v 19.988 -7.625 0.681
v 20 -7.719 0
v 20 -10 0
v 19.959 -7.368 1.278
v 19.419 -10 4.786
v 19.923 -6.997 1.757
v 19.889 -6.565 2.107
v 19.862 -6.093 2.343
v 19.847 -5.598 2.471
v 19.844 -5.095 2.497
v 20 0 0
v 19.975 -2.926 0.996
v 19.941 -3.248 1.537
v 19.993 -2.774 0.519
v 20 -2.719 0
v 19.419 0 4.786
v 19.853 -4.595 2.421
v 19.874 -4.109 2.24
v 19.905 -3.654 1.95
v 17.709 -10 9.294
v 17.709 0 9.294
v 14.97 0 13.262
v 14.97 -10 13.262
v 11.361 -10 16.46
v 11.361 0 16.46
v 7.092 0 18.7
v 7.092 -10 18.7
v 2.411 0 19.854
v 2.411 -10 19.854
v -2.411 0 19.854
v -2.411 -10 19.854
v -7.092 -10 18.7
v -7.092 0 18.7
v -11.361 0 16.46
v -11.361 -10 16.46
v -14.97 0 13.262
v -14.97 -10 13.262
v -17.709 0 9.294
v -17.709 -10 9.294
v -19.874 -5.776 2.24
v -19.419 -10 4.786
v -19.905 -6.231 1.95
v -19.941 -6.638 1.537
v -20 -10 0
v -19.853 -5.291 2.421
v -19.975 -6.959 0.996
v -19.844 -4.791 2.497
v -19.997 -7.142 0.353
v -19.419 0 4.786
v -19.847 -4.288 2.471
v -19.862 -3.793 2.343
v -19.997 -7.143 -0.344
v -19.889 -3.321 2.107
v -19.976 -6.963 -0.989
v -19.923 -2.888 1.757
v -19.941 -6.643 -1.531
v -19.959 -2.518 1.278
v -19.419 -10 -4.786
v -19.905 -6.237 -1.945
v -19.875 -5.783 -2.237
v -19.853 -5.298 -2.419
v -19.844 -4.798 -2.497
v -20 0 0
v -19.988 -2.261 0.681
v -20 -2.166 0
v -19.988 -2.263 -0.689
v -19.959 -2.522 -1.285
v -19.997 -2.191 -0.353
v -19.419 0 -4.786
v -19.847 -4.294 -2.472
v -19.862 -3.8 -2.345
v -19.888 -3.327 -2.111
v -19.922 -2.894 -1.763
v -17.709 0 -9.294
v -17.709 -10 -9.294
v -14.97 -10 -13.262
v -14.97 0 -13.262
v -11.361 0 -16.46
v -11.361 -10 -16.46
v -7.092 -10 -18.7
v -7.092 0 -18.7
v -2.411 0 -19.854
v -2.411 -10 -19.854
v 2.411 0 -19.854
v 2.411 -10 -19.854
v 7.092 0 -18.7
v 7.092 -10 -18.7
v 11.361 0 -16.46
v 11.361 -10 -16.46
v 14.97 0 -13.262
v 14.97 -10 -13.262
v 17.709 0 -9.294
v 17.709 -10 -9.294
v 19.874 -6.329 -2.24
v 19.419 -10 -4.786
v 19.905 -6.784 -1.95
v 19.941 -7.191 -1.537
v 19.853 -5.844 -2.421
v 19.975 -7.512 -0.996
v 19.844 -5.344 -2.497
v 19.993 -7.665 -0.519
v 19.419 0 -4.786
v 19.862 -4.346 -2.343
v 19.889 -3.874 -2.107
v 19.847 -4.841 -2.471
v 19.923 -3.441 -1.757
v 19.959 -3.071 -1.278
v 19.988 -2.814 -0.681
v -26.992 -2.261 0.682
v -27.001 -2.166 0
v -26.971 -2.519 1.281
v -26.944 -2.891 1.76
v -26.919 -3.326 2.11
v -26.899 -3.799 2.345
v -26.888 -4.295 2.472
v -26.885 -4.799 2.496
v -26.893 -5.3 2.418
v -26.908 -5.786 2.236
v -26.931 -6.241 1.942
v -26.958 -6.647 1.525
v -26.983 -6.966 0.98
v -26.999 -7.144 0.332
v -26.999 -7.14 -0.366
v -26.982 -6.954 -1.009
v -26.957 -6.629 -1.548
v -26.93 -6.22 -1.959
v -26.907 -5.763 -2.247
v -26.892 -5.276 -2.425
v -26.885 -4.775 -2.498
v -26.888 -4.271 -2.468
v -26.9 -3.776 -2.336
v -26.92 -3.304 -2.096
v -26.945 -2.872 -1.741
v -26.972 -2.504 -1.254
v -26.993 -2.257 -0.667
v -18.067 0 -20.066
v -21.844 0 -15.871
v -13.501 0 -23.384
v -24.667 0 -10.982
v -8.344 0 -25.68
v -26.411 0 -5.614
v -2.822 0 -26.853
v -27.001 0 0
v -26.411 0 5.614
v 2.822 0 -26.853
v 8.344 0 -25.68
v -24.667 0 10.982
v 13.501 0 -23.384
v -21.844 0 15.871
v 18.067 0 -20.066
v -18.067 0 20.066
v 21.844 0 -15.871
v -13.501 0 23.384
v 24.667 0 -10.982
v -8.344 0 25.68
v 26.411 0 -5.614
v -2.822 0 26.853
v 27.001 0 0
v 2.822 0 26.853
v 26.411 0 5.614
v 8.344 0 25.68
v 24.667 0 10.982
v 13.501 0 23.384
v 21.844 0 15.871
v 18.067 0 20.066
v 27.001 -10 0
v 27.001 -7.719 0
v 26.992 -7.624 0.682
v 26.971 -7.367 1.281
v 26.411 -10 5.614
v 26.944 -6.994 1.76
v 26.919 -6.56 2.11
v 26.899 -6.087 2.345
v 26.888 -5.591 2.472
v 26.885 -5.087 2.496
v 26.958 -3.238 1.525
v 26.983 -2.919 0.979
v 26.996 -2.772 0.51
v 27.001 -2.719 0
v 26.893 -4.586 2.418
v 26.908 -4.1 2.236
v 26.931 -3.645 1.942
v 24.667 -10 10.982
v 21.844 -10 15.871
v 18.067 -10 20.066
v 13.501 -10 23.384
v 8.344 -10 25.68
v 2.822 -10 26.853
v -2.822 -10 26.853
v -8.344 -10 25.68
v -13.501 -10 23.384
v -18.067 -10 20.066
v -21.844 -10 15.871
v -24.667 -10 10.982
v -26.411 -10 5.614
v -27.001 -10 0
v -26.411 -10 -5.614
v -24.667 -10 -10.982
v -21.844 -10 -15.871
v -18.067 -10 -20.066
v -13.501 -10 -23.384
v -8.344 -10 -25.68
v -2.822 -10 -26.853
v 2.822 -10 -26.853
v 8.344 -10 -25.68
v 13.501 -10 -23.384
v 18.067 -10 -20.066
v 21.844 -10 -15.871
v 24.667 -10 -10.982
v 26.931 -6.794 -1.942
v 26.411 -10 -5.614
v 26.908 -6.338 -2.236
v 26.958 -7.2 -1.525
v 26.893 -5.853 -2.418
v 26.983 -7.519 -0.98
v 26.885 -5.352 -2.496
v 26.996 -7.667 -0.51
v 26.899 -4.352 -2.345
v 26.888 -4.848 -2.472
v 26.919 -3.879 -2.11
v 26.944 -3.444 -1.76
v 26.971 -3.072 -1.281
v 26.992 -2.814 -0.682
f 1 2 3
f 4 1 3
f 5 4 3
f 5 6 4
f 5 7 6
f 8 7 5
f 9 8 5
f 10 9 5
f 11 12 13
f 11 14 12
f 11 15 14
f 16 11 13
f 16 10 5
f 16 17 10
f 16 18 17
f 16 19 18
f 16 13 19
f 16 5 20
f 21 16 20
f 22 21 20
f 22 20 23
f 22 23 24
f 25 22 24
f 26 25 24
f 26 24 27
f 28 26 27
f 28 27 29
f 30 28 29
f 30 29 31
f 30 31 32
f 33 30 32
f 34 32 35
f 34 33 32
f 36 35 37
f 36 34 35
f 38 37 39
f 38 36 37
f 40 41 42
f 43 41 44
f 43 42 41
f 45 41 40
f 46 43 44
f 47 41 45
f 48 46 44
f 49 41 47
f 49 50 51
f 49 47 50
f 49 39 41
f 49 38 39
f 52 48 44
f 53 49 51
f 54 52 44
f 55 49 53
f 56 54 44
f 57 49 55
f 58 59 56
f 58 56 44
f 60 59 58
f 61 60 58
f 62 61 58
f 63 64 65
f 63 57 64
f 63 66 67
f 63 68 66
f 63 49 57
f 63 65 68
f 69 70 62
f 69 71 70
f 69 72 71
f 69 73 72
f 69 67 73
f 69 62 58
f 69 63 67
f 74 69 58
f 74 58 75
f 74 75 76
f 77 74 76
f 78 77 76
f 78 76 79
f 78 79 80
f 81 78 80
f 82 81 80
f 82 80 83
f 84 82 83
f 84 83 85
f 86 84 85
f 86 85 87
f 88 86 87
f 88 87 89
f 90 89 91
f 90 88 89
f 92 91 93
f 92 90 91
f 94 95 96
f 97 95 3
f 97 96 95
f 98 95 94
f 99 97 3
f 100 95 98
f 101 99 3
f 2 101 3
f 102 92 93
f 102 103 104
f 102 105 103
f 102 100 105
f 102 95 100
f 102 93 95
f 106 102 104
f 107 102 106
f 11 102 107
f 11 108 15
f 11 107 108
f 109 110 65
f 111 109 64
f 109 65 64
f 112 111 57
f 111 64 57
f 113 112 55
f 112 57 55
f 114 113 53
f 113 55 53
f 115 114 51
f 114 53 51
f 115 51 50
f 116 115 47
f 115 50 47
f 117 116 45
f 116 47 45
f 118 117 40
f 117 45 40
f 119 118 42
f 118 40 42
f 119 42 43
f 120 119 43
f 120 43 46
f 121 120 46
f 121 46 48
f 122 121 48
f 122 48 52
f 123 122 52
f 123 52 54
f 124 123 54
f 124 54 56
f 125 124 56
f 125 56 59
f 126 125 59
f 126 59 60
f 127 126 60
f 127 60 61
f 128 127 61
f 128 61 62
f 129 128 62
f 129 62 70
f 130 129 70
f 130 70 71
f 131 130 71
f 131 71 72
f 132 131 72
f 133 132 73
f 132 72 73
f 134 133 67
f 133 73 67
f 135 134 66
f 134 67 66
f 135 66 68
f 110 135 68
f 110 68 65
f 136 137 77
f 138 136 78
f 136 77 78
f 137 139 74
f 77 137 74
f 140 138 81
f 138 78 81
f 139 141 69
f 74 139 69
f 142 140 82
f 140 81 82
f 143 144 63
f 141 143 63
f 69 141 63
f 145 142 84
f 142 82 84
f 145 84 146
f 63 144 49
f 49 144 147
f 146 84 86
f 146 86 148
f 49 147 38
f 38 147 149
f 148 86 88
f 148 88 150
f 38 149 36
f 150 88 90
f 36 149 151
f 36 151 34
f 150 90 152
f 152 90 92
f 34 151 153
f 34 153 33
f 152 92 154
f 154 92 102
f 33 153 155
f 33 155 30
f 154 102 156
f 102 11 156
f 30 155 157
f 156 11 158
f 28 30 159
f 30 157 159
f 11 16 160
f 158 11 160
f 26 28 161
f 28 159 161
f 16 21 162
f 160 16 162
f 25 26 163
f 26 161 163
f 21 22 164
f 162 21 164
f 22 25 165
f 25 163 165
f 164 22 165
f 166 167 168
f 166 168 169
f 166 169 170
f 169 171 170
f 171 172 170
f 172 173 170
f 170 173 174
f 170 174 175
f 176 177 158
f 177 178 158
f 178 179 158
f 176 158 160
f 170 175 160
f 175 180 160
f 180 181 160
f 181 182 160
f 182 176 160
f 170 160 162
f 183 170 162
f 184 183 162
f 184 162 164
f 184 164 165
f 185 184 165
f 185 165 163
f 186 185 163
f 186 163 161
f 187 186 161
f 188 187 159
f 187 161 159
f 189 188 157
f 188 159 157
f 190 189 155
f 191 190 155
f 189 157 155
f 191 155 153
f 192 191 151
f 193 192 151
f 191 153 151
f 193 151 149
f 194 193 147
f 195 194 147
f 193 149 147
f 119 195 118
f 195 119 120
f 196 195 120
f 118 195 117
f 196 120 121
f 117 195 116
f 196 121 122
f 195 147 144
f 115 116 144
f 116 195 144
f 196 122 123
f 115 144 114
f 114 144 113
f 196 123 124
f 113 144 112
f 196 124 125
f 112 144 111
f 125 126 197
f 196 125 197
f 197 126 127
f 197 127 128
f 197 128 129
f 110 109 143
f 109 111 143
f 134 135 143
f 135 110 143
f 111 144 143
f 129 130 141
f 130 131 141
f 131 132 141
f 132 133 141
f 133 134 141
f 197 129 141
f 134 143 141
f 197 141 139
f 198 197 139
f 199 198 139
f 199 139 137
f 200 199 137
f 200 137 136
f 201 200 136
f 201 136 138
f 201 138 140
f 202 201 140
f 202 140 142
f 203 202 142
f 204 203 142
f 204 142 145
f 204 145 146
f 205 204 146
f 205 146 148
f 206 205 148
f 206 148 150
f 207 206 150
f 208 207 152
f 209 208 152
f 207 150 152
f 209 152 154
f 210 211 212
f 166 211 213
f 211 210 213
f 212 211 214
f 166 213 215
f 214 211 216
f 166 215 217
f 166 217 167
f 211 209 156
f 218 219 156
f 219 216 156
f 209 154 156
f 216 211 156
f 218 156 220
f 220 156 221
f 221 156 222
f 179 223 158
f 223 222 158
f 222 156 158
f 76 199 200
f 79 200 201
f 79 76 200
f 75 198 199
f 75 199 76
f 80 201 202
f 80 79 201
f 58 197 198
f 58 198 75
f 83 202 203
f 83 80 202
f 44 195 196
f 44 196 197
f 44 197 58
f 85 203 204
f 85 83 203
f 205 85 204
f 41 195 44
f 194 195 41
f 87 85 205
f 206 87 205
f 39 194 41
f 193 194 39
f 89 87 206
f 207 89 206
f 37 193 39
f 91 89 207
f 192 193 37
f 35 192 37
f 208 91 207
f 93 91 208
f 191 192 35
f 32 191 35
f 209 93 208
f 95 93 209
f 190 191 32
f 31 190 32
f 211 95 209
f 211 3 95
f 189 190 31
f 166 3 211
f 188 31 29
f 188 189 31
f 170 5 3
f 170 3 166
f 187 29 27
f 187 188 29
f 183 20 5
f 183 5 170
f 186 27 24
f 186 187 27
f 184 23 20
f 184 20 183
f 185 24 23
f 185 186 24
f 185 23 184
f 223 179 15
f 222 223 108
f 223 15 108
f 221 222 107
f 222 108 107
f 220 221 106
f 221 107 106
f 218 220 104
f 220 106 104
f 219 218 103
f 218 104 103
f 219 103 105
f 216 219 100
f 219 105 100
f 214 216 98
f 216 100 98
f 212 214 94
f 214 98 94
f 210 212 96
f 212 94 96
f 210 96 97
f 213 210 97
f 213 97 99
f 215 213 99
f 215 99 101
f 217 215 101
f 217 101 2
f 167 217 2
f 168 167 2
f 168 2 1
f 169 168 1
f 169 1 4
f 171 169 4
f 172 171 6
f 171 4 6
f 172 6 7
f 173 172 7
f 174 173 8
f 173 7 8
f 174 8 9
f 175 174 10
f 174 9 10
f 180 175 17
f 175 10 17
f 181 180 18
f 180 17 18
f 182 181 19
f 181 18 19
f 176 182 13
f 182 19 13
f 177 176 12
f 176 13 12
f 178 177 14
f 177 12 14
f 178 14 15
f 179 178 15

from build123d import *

# Parameters (mm, degrees)
F0_R     = 27.0011142562
F0_R_2   = 20
F1_DEPTH = 10
F3_D     = 5
F3_DEPTH = 27.0021142562
F5_D     = 5
F5_DEPTH = 27.0021143562


with BuildPart() as f1:
    # F0 (on Front) → F1 (new body)
    with BuildSketch(Plane.XZ):
        Circle(F0_R)
        Circle(F0_R_2, mode=Mode.SUBTRACT)
    extrude(amount=F1_DEPTH)

    # F3 (through all, one way)
    with BuildSketch(Plane.YZ):
        with Locations((-4.6664830297, 0)):
            Circle(F3_D / 2)
    extrude(amount=-F3_DEPTH, mode=Mode.SUBTRACT)

    # F5 (through all, one way)
    with BuildSketch(Plane(origin=(0, 0, 0), x_dir=(0, 1, 0), z_dir=(-1, 0, 0))):
        with Locations((-5.219371058, 0)):
            Circle(F5_D / 2)
    extrude(amount=-F5_DEPTH, mode=Mode.SUBTRACT)


solid = f1.part
